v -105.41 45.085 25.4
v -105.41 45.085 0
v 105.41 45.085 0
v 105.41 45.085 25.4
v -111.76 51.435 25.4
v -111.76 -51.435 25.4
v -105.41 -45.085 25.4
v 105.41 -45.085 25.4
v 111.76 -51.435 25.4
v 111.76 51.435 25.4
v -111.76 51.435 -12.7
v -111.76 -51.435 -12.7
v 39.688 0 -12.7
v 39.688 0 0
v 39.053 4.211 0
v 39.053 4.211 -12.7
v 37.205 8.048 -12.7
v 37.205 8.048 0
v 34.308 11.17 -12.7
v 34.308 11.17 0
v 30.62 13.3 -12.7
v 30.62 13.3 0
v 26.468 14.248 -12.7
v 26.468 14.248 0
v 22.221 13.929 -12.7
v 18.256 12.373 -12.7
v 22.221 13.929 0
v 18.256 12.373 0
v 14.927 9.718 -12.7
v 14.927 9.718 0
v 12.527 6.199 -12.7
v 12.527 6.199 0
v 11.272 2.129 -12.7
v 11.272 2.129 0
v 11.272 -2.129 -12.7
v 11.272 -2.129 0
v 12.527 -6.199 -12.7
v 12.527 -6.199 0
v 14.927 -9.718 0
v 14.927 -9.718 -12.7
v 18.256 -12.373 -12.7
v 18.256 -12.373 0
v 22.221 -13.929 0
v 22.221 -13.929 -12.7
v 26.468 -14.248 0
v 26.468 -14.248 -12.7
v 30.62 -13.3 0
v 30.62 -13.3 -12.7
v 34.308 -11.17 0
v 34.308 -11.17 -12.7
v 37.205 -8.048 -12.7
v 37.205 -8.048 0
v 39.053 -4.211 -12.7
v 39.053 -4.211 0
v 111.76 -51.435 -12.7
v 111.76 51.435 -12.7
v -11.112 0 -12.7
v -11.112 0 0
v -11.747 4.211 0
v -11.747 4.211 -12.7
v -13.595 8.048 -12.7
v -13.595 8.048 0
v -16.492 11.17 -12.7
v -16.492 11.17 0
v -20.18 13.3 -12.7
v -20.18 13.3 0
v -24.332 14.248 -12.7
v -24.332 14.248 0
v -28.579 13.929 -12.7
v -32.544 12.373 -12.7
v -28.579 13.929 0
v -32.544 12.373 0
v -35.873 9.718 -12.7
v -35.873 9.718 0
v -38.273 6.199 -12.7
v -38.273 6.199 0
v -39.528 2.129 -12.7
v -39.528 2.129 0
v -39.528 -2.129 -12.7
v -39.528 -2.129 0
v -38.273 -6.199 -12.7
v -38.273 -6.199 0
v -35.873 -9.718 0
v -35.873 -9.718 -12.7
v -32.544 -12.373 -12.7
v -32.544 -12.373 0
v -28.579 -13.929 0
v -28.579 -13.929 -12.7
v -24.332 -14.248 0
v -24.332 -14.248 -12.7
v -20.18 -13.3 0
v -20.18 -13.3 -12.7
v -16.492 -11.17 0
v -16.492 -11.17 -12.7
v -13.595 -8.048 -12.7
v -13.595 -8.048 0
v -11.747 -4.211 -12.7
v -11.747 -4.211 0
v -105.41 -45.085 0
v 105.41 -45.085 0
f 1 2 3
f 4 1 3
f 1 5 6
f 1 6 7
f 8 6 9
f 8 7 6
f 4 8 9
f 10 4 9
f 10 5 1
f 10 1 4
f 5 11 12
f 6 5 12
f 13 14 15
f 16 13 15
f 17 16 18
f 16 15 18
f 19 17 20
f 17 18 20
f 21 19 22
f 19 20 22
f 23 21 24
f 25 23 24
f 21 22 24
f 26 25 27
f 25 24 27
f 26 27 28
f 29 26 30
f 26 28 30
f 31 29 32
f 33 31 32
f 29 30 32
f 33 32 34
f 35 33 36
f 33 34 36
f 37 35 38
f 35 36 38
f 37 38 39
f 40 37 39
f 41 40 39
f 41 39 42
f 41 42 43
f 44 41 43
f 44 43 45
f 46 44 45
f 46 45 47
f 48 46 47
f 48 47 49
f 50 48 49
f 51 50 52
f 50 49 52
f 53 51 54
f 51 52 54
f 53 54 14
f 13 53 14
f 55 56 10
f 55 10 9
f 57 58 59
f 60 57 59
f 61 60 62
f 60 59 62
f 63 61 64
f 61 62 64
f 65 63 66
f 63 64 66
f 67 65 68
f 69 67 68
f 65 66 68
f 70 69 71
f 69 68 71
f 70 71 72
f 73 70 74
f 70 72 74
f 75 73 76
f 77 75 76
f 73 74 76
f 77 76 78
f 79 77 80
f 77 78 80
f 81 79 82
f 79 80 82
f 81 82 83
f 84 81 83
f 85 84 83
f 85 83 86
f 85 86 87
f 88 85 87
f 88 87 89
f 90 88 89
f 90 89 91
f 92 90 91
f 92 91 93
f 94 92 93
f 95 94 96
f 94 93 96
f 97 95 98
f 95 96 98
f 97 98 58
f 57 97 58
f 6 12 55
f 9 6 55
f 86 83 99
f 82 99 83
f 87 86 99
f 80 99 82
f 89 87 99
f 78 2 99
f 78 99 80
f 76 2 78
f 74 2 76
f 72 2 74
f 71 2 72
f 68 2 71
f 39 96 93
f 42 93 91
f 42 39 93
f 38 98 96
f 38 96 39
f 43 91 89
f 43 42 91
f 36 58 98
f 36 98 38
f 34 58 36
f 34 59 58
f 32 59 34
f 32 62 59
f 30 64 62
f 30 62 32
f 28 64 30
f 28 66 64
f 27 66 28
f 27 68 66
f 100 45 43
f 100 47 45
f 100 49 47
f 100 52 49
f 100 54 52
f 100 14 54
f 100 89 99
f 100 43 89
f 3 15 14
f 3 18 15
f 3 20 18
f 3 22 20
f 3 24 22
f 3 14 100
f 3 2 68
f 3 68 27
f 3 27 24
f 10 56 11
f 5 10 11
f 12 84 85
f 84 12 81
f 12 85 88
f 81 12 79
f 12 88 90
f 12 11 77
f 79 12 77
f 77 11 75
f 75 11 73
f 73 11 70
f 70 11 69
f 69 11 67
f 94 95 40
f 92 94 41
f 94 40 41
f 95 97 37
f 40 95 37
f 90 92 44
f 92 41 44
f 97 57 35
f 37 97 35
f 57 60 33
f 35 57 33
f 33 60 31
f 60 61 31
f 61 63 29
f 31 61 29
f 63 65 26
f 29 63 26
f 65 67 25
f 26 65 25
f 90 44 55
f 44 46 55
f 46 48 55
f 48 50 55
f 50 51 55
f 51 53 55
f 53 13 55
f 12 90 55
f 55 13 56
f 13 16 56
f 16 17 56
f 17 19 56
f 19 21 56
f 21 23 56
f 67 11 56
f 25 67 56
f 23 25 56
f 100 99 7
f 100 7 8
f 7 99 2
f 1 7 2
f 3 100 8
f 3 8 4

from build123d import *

# Parameters (mm, degrees)
BOSS_EXTRUDE1_DEPTH      = 25.4
BOSS_EXTRUDE1_DEPTH_BACK = 12.7
SKETCH1_W                = 223.52
SKETCH1_H                = 102.87
SKETCH1_W_2              = 210.82
SKETCH1_H_2              = 90.17
SKETCH1_3_W              = 210.82
SKETCH1_3_H              = 90.17
SKETCH1_3_R              = 14.2875
BOSS_EXTRUDE2_DEPTH      = 12.7


with BuildPart() as part:
    # Sketch1 → Boss-Extrude1 (new, two sides: drawn at the far end of the back side and taken through both)
    with BuildSketch(Plane.XY.offset(-BOSS_EXTRUDE1_DEPTH_BACK)):
        Rectangle(SKETCH1_W, SKETCH1_H)
        Rectangle(SKETCH1_W_2, SKETCH1_H_2, mode=Mode.SUBTRACT)
    extrude(amount=BOSS_EXTRUDE1_DEPTH + BOSS_EXTRUDE1_DEPTH_BACK)

    # Sketch1<3> → Boss-Extrude2 (add)
    with BuildSketch(Plane.XY):
        Rectangle(SKETCH1_3_W, SKETCH1_3_H)
        with Locations((-25.4, 0)):
            Circle(SKETCH1_3_R, mode=Mode.SUBTRACT)
        with Locations((25.4, 0)):
            Circle(SKETCH1_3_R, mode=Mode.SUBTRACT)
    extrude(amount=-BOSS_EXTRUDE2_DEPTH)


solid = part.part
